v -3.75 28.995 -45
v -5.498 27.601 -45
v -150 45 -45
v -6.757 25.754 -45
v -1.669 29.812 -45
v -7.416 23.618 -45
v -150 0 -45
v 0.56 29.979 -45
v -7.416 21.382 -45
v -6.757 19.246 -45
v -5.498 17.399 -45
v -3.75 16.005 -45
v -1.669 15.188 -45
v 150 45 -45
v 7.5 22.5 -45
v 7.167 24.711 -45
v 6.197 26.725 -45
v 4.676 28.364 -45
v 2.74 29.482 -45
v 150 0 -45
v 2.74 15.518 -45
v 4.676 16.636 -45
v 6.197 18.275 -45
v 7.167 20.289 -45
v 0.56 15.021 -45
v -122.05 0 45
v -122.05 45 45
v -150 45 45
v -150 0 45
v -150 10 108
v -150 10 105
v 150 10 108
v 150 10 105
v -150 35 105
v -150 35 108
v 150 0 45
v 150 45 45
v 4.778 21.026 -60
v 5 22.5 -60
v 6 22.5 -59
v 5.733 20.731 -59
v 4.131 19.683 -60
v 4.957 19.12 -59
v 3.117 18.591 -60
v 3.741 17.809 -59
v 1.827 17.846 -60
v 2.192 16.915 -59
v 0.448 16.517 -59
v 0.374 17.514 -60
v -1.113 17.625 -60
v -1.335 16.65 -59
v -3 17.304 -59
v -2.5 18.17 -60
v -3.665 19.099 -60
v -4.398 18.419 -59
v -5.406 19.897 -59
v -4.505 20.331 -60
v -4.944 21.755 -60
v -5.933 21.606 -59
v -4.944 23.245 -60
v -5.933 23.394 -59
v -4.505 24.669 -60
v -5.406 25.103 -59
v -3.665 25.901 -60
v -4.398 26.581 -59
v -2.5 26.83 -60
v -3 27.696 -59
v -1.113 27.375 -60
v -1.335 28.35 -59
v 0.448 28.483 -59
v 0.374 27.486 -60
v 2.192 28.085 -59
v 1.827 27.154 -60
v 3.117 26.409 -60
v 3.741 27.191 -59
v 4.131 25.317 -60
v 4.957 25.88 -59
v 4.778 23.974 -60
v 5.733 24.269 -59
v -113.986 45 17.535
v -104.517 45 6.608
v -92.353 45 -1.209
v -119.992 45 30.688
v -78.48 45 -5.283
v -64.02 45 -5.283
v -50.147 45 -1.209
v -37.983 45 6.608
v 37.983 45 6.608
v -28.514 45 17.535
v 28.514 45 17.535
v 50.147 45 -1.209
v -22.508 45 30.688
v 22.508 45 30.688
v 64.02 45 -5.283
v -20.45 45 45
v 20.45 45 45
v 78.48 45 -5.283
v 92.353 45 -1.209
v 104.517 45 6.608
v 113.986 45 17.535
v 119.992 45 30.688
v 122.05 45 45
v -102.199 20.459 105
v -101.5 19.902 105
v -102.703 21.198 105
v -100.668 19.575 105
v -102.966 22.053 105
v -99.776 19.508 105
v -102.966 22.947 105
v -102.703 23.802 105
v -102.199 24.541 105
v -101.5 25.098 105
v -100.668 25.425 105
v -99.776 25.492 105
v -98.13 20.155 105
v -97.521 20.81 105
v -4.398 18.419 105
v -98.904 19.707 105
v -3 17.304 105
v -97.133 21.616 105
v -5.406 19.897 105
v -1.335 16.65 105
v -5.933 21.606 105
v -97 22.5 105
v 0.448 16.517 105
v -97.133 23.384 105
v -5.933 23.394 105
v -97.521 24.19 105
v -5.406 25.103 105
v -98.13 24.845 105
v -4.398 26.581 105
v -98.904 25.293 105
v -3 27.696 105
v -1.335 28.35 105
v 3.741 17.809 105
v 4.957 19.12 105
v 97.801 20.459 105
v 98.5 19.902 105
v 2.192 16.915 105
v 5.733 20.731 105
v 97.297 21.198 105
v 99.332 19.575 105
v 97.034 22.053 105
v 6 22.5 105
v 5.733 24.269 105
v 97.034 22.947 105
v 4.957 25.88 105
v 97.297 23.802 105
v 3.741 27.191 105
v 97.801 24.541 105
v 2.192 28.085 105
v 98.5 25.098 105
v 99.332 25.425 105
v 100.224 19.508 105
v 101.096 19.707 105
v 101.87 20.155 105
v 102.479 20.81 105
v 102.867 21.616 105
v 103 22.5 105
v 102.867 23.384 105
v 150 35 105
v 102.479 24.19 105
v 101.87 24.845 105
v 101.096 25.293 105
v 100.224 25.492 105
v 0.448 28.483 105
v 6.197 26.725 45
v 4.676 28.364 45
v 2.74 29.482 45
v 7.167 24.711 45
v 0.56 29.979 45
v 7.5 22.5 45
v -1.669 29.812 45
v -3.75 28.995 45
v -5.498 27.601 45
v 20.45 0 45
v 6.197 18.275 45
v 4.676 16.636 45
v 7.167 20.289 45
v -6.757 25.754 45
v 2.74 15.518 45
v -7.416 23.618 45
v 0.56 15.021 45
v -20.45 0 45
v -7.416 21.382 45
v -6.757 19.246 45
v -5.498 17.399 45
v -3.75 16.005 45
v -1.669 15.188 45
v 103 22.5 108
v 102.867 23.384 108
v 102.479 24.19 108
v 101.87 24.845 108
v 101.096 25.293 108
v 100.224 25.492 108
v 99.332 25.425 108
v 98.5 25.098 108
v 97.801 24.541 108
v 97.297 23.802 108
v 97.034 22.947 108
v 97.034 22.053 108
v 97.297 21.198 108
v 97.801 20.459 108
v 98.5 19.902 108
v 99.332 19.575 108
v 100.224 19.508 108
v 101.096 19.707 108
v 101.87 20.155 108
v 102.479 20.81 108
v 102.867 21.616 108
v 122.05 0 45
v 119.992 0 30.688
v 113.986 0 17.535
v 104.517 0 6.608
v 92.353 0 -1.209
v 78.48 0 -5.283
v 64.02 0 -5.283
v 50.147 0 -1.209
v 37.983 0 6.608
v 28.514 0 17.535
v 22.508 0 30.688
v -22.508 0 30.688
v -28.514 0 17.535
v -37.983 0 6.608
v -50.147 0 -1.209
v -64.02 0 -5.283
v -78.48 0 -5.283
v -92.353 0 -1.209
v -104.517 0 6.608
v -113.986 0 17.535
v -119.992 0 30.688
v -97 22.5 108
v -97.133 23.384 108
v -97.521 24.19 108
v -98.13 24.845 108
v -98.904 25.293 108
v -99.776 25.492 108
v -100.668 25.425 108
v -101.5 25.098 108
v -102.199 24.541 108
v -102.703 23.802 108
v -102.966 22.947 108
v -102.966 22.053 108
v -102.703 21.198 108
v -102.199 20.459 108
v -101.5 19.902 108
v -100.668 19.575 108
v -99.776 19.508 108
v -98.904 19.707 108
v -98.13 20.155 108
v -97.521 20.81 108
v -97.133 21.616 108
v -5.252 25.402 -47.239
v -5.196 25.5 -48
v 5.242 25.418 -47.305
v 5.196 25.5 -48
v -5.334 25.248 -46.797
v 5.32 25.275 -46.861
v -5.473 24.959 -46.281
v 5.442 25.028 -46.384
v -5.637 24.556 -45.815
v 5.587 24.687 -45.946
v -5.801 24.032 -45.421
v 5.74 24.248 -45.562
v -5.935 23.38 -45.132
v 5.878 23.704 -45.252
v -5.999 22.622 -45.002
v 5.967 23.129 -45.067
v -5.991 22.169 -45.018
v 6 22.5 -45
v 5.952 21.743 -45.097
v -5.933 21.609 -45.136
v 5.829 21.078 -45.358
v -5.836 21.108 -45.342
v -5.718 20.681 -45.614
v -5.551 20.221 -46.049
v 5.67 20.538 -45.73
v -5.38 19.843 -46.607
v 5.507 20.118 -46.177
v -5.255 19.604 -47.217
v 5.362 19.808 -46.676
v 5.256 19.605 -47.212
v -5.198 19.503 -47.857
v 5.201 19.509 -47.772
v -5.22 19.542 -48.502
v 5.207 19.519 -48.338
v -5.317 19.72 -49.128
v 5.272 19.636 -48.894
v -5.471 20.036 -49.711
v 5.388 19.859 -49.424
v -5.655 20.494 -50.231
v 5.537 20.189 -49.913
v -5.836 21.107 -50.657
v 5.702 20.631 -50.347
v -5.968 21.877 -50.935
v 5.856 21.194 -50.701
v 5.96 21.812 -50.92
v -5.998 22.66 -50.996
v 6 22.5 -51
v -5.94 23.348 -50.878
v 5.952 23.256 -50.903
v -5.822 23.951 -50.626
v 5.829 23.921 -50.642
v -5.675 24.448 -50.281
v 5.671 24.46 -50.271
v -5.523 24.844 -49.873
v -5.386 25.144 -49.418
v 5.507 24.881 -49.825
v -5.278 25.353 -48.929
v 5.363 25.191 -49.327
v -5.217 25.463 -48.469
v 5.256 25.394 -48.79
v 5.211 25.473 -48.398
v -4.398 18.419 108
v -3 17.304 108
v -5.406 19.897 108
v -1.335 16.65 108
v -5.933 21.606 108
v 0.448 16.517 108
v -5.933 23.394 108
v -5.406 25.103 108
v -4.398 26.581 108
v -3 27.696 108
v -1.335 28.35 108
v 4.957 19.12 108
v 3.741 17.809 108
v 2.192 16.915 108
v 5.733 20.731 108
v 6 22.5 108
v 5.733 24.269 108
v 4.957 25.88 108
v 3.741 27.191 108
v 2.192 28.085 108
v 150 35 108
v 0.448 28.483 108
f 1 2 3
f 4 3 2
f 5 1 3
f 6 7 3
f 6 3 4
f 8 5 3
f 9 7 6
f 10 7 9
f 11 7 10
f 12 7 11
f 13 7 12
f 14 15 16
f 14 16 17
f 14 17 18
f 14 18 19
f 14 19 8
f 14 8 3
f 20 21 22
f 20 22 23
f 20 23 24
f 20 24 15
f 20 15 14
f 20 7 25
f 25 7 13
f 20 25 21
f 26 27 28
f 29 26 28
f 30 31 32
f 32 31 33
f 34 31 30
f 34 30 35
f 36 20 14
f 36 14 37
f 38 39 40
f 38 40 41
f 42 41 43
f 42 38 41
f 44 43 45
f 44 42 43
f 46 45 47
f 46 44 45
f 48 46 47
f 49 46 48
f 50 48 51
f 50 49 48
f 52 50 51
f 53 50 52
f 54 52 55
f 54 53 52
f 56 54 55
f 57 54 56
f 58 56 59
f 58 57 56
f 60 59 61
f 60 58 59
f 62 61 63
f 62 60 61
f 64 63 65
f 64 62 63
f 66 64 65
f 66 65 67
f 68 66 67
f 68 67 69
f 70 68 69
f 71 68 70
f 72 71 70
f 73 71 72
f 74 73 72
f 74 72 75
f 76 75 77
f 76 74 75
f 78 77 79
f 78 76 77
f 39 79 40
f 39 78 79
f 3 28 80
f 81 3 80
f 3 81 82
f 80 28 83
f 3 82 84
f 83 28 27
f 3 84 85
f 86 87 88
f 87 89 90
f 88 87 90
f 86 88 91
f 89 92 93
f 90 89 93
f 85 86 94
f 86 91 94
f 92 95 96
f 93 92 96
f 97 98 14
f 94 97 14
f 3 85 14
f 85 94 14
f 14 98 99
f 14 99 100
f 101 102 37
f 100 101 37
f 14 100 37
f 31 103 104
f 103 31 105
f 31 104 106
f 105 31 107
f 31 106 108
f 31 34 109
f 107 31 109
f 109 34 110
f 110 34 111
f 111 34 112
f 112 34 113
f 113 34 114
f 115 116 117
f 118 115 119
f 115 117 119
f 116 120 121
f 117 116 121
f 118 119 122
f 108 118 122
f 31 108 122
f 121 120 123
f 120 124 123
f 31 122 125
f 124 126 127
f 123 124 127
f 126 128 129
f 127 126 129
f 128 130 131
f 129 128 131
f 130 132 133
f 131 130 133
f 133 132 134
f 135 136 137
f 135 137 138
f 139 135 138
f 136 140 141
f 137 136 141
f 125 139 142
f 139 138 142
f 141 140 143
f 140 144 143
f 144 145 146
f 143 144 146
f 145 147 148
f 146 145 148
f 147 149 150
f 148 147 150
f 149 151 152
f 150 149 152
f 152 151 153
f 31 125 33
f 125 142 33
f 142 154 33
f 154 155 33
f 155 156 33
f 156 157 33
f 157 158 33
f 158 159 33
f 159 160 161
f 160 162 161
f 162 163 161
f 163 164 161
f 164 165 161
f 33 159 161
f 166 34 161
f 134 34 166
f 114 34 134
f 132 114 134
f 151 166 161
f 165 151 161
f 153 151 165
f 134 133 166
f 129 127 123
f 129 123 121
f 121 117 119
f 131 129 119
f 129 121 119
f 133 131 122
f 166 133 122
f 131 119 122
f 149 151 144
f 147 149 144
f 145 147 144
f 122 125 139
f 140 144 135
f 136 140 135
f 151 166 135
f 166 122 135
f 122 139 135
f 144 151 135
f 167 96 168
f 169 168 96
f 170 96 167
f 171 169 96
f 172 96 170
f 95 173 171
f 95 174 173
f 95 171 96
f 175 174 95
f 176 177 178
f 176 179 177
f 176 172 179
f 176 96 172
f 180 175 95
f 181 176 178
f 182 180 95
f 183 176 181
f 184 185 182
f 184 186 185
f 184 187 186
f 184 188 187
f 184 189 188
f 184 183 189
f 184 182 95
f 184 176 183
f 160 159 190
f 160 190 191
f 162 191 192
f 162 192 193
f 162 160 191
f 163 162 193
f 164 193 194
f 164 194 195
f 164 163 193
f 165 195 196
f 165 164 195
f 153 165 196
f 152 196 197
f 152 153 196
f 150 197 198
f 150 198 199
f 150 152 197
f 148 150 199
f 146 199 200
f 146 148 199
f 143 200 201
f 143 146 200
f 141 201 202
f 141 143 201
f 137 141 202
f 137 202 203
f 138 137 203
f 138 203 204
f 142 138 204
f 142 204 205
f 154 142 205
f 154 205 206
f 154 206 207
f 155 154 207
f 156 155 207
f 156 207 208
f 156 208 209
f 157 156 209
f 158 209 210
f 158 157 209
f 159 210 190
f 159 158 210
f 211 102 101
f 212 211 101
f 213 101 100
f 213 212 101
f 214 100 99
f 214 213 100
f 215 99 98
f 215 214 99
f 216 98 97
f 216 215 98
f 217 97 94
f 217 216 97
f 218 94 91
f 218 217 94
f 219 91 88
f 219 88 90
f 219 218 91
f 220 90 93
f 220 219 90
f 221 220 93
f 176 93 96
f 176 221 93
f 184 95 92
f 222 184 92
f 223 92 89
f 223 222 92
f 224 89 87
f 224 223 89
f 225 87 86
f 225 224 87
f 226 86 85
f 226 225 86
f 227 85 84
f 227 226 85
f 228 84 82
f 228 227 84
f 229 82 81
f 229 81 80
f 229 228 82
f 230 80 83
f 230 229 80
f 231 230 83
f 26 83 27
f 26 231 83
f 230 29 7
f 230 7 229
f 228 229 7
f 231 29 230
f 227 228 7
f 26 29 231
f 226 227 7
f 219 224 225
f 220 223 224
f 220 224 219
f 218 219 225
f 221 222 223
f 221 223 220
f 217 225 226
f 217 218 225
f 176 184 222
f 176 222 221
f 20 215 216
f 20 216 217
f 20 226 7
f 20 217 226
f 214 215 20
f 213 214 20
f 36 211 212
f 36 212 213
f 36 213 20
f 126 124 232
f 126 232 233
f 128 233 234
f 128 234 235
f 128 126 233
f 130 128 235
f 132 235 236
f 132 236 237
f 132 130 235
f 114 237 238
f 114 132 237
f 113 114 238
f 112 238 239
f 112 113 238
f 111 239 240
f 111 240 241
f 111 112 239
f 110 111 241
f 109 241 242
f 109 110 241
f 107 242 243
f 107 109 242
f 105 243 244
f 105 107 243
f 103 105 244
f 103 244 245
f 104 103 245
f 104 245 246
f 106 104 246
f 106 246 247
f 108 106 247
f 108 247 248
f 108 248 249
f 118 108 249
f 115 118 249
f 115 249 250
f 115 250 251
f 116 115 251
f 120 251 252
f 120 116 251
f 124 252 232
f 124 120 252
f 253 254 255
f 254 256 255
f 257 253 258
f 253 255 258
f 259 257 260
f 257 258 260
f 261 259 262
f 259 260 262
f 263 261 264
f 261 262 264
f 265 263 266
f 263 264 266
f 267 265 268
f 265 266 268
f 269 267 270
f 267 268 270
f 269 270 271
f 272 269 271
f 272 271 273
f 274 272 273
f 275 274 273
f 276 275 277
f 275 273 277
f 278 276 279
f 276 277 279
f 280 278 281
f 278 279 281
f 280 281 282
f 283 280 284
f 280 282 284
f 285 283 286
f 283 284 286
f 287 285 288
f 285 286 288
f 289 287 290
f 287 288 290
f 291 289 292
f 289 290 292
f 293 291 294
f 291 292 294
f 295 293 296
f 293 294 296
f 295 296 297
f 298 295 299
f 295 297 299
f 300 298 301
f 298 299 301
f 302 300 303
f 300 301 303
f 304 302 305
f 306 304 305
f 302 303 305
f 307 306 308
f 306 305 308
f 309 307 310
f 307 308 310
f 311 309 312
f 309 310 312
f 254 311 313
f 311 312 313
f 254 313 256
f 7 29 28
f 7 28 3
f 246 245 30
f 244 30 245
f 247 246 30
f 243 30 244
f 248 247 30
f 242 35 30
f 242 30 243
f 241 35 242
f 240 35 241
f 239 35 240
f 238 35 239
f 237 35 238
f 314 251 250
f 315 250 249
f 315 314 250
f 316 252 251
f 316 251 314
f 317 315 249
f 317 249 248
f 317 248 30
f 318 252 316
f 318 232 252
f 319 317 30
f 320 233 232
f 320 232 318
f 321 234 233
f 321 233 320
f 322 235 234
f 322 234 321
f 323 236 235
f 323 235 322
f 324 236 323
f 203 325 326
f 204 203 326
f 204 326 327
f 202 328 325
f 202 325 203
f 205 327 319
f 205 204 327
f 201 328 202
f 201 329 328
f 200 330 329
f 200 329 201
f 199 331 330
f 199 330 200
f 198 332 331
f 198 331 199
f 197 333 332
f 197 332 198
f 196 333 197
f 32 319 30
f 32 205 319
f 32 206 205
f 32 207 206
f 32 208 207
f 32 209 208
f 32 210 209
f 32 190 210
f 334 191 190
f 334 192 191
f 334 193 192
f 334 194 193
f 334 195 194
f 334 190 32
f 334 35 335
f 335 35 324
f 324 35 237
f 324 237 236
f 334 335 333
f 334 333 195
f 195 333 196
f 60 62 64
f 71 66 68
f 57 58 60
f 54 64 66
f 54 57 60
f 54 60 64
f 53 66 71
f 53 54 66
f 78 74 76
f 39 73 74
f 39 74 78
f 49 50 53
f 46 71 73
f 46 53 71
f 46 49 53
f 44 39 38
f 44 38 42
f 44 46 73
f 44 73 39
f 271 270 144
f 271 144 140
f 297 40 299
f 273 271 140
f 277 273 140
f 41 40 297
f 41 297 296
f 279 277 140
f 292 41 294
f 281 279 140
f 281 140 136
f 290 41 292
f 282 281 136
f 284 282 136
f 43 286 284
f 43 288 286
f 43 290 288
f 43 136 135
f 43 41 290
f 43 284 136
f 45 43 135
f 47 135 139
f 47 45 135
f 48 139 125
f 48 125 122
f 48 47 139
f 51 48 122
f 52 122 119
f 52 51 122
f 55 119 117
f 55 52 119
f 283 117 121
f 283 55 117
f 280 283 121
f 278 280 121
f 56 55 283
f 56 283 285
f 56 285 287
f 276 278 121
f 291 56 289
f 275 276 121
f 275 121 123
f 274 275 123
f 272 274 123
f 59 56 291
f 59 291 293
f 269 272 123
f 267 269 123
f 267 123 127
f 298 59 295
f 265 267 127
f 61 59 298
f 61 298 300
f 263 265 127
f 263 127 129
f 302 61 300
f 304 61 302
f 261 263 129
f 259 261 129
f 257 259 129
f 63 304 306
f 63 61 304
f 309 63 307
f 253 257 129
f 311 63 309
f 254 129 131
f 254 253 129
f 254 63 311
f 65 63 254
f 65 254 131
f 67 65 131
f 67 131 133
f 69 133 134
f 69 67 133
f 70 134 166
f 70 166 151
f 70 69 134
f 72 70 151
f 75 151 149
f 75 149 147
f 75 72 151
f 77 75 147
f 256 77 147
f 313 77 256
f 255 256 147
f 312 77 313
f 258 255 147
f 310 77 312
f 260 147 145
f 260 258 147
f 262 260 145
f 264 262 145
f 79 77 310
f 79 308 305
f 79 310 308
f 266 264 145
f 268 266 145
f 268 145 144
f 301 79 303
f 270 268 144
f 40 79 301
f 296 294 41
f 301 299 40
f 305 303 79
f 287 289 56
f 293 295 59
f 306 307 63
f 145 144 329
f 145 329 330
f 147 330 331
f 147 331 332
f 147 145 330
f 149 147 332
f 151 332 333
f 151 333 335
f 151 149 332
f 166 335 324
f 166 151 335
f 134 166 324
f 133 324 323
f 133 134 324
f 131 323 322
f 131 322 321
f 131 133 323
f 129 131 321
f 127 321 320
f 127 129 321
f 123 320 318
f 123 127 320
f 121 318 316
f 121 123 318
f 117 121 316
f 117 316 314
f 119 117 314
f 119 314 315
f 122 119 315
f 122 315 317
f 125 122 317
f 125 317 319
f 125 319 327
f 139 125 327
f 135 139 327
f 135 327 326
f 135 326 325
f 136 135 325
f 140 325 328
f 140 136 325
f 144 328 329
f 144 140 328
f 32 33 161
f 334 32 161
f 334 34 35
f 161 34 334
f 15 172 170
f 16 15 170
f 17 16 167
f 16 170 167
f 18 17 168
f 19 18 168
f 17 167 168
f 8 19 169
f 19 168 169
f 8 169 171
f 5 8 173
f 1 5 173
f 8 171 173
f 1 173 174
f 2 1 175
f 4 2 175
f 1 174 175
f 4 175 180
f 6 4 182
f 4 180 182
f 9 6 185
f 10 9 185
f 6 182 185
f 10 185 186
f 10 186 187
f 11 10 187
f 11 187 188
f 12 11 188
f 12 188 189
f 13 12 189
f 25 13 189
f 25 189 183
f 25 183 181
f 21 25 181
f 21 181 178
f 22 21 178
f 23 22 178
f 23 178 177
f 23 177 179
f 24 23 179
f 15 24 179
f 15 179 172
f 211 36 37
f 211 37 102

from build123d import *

# Parameters (mm, degrees)
F1_DEPTH      = 45
F2_R          = 7.5
F3_DEPTH      = 90.001
F4_R          = 6
F5_DEPTH      = 15
F5_DEPTH_BACK = 150
F6_W          = 300
F6_H          = 25
F6_R          = 3
F6_R_2        = 6
F7_DEPTH      = 3
F8_R          = 3
F9_DEPTH      = 12.5
F10_SIZE      = 1


with BuildPart() as f1:
    # F0 (on Front) → F1 (new body)
    with BuildSketch(Plane.XZ):
        with BuildLine():
            Line((150, -45), (150, 45))
            Line((150, 45), (122.05, 45))
            ThreePointArc((122.05, 45), (71.25, -5.8), (20.45, 45))
            Line((20.45, 45), (-20.45, 45))
            ThreePointArc((-20.45, 45), (-71.25, -5.8), (-122.05, 45))
            Line((-122.05, 45), (-150, 45))
            Line((-150, 45), (-150, -45))
            Line((-150, -45), (150, -45))
        make_face()
    extrude(amount=-F1_DEPTH)

    # F2 (on face) → F3 (cut, through all)
    with BuildSketch(Plane.XY.offset(45)):
        with Locations((0, 22.5)):
            Circle(F2_R)
    extrude(amount=-F3_DEPTH, mode=Mode.SUBTRACT)


with BuildPart() as f5:
    # F4 (on face) → F5 (new body, two sides)
    with BuildSketch(Plane(origin=(0, 0, -45), x_dir=(1, 0, 0), z_dir=(0, 0, -1))) as f5_sk:
        with Locations((0, -22.5)):
            Circle(F4_R)
    extrude(amount=F5_DEPTH)
    extrude(f5_sk.sketch, amount=-F5_DEPTH_BACK)

    # F8 (on Right) → F9 (cut, symmetric)
    with BuildSketch(Plane.YZ):
        with Locations((22.5, -48)):
            Circle(F8_R)
    extrude(amount=F9_DEPTH, both=True, mode=Mode.SUBTRACT)

    # F10
    f10_edges = [f5.edges().sort_by_distance(p)[0] for p in [
        (-6, 22.5, -60),
    ]]
    chamfer(f10_edges, length=F10_SIZE)


with BuildPart() as f7:
    # F6 (on face) → F7 (new body)
    with BuildSketch(Plane.XY.offset(105)):
        with Locations((0, 22.5)):
            Rectangle(F6_W, F6_H)
        with Locations((-100, 22.5)):
            Circle(F6_R, mode=Mode.SUBTRACT)
        with Locations((0, 22.5)):
            Circle(F6_R_2, mode=Mode.SUBTRACT)
        with Locations((100, 22.5)):
            Circle(F6_R, mode=Mode.SUBTRACT)
    extrude(amount=F7_DEPTH)


solid = Compound([f1.part, f5.part, f7.part])
